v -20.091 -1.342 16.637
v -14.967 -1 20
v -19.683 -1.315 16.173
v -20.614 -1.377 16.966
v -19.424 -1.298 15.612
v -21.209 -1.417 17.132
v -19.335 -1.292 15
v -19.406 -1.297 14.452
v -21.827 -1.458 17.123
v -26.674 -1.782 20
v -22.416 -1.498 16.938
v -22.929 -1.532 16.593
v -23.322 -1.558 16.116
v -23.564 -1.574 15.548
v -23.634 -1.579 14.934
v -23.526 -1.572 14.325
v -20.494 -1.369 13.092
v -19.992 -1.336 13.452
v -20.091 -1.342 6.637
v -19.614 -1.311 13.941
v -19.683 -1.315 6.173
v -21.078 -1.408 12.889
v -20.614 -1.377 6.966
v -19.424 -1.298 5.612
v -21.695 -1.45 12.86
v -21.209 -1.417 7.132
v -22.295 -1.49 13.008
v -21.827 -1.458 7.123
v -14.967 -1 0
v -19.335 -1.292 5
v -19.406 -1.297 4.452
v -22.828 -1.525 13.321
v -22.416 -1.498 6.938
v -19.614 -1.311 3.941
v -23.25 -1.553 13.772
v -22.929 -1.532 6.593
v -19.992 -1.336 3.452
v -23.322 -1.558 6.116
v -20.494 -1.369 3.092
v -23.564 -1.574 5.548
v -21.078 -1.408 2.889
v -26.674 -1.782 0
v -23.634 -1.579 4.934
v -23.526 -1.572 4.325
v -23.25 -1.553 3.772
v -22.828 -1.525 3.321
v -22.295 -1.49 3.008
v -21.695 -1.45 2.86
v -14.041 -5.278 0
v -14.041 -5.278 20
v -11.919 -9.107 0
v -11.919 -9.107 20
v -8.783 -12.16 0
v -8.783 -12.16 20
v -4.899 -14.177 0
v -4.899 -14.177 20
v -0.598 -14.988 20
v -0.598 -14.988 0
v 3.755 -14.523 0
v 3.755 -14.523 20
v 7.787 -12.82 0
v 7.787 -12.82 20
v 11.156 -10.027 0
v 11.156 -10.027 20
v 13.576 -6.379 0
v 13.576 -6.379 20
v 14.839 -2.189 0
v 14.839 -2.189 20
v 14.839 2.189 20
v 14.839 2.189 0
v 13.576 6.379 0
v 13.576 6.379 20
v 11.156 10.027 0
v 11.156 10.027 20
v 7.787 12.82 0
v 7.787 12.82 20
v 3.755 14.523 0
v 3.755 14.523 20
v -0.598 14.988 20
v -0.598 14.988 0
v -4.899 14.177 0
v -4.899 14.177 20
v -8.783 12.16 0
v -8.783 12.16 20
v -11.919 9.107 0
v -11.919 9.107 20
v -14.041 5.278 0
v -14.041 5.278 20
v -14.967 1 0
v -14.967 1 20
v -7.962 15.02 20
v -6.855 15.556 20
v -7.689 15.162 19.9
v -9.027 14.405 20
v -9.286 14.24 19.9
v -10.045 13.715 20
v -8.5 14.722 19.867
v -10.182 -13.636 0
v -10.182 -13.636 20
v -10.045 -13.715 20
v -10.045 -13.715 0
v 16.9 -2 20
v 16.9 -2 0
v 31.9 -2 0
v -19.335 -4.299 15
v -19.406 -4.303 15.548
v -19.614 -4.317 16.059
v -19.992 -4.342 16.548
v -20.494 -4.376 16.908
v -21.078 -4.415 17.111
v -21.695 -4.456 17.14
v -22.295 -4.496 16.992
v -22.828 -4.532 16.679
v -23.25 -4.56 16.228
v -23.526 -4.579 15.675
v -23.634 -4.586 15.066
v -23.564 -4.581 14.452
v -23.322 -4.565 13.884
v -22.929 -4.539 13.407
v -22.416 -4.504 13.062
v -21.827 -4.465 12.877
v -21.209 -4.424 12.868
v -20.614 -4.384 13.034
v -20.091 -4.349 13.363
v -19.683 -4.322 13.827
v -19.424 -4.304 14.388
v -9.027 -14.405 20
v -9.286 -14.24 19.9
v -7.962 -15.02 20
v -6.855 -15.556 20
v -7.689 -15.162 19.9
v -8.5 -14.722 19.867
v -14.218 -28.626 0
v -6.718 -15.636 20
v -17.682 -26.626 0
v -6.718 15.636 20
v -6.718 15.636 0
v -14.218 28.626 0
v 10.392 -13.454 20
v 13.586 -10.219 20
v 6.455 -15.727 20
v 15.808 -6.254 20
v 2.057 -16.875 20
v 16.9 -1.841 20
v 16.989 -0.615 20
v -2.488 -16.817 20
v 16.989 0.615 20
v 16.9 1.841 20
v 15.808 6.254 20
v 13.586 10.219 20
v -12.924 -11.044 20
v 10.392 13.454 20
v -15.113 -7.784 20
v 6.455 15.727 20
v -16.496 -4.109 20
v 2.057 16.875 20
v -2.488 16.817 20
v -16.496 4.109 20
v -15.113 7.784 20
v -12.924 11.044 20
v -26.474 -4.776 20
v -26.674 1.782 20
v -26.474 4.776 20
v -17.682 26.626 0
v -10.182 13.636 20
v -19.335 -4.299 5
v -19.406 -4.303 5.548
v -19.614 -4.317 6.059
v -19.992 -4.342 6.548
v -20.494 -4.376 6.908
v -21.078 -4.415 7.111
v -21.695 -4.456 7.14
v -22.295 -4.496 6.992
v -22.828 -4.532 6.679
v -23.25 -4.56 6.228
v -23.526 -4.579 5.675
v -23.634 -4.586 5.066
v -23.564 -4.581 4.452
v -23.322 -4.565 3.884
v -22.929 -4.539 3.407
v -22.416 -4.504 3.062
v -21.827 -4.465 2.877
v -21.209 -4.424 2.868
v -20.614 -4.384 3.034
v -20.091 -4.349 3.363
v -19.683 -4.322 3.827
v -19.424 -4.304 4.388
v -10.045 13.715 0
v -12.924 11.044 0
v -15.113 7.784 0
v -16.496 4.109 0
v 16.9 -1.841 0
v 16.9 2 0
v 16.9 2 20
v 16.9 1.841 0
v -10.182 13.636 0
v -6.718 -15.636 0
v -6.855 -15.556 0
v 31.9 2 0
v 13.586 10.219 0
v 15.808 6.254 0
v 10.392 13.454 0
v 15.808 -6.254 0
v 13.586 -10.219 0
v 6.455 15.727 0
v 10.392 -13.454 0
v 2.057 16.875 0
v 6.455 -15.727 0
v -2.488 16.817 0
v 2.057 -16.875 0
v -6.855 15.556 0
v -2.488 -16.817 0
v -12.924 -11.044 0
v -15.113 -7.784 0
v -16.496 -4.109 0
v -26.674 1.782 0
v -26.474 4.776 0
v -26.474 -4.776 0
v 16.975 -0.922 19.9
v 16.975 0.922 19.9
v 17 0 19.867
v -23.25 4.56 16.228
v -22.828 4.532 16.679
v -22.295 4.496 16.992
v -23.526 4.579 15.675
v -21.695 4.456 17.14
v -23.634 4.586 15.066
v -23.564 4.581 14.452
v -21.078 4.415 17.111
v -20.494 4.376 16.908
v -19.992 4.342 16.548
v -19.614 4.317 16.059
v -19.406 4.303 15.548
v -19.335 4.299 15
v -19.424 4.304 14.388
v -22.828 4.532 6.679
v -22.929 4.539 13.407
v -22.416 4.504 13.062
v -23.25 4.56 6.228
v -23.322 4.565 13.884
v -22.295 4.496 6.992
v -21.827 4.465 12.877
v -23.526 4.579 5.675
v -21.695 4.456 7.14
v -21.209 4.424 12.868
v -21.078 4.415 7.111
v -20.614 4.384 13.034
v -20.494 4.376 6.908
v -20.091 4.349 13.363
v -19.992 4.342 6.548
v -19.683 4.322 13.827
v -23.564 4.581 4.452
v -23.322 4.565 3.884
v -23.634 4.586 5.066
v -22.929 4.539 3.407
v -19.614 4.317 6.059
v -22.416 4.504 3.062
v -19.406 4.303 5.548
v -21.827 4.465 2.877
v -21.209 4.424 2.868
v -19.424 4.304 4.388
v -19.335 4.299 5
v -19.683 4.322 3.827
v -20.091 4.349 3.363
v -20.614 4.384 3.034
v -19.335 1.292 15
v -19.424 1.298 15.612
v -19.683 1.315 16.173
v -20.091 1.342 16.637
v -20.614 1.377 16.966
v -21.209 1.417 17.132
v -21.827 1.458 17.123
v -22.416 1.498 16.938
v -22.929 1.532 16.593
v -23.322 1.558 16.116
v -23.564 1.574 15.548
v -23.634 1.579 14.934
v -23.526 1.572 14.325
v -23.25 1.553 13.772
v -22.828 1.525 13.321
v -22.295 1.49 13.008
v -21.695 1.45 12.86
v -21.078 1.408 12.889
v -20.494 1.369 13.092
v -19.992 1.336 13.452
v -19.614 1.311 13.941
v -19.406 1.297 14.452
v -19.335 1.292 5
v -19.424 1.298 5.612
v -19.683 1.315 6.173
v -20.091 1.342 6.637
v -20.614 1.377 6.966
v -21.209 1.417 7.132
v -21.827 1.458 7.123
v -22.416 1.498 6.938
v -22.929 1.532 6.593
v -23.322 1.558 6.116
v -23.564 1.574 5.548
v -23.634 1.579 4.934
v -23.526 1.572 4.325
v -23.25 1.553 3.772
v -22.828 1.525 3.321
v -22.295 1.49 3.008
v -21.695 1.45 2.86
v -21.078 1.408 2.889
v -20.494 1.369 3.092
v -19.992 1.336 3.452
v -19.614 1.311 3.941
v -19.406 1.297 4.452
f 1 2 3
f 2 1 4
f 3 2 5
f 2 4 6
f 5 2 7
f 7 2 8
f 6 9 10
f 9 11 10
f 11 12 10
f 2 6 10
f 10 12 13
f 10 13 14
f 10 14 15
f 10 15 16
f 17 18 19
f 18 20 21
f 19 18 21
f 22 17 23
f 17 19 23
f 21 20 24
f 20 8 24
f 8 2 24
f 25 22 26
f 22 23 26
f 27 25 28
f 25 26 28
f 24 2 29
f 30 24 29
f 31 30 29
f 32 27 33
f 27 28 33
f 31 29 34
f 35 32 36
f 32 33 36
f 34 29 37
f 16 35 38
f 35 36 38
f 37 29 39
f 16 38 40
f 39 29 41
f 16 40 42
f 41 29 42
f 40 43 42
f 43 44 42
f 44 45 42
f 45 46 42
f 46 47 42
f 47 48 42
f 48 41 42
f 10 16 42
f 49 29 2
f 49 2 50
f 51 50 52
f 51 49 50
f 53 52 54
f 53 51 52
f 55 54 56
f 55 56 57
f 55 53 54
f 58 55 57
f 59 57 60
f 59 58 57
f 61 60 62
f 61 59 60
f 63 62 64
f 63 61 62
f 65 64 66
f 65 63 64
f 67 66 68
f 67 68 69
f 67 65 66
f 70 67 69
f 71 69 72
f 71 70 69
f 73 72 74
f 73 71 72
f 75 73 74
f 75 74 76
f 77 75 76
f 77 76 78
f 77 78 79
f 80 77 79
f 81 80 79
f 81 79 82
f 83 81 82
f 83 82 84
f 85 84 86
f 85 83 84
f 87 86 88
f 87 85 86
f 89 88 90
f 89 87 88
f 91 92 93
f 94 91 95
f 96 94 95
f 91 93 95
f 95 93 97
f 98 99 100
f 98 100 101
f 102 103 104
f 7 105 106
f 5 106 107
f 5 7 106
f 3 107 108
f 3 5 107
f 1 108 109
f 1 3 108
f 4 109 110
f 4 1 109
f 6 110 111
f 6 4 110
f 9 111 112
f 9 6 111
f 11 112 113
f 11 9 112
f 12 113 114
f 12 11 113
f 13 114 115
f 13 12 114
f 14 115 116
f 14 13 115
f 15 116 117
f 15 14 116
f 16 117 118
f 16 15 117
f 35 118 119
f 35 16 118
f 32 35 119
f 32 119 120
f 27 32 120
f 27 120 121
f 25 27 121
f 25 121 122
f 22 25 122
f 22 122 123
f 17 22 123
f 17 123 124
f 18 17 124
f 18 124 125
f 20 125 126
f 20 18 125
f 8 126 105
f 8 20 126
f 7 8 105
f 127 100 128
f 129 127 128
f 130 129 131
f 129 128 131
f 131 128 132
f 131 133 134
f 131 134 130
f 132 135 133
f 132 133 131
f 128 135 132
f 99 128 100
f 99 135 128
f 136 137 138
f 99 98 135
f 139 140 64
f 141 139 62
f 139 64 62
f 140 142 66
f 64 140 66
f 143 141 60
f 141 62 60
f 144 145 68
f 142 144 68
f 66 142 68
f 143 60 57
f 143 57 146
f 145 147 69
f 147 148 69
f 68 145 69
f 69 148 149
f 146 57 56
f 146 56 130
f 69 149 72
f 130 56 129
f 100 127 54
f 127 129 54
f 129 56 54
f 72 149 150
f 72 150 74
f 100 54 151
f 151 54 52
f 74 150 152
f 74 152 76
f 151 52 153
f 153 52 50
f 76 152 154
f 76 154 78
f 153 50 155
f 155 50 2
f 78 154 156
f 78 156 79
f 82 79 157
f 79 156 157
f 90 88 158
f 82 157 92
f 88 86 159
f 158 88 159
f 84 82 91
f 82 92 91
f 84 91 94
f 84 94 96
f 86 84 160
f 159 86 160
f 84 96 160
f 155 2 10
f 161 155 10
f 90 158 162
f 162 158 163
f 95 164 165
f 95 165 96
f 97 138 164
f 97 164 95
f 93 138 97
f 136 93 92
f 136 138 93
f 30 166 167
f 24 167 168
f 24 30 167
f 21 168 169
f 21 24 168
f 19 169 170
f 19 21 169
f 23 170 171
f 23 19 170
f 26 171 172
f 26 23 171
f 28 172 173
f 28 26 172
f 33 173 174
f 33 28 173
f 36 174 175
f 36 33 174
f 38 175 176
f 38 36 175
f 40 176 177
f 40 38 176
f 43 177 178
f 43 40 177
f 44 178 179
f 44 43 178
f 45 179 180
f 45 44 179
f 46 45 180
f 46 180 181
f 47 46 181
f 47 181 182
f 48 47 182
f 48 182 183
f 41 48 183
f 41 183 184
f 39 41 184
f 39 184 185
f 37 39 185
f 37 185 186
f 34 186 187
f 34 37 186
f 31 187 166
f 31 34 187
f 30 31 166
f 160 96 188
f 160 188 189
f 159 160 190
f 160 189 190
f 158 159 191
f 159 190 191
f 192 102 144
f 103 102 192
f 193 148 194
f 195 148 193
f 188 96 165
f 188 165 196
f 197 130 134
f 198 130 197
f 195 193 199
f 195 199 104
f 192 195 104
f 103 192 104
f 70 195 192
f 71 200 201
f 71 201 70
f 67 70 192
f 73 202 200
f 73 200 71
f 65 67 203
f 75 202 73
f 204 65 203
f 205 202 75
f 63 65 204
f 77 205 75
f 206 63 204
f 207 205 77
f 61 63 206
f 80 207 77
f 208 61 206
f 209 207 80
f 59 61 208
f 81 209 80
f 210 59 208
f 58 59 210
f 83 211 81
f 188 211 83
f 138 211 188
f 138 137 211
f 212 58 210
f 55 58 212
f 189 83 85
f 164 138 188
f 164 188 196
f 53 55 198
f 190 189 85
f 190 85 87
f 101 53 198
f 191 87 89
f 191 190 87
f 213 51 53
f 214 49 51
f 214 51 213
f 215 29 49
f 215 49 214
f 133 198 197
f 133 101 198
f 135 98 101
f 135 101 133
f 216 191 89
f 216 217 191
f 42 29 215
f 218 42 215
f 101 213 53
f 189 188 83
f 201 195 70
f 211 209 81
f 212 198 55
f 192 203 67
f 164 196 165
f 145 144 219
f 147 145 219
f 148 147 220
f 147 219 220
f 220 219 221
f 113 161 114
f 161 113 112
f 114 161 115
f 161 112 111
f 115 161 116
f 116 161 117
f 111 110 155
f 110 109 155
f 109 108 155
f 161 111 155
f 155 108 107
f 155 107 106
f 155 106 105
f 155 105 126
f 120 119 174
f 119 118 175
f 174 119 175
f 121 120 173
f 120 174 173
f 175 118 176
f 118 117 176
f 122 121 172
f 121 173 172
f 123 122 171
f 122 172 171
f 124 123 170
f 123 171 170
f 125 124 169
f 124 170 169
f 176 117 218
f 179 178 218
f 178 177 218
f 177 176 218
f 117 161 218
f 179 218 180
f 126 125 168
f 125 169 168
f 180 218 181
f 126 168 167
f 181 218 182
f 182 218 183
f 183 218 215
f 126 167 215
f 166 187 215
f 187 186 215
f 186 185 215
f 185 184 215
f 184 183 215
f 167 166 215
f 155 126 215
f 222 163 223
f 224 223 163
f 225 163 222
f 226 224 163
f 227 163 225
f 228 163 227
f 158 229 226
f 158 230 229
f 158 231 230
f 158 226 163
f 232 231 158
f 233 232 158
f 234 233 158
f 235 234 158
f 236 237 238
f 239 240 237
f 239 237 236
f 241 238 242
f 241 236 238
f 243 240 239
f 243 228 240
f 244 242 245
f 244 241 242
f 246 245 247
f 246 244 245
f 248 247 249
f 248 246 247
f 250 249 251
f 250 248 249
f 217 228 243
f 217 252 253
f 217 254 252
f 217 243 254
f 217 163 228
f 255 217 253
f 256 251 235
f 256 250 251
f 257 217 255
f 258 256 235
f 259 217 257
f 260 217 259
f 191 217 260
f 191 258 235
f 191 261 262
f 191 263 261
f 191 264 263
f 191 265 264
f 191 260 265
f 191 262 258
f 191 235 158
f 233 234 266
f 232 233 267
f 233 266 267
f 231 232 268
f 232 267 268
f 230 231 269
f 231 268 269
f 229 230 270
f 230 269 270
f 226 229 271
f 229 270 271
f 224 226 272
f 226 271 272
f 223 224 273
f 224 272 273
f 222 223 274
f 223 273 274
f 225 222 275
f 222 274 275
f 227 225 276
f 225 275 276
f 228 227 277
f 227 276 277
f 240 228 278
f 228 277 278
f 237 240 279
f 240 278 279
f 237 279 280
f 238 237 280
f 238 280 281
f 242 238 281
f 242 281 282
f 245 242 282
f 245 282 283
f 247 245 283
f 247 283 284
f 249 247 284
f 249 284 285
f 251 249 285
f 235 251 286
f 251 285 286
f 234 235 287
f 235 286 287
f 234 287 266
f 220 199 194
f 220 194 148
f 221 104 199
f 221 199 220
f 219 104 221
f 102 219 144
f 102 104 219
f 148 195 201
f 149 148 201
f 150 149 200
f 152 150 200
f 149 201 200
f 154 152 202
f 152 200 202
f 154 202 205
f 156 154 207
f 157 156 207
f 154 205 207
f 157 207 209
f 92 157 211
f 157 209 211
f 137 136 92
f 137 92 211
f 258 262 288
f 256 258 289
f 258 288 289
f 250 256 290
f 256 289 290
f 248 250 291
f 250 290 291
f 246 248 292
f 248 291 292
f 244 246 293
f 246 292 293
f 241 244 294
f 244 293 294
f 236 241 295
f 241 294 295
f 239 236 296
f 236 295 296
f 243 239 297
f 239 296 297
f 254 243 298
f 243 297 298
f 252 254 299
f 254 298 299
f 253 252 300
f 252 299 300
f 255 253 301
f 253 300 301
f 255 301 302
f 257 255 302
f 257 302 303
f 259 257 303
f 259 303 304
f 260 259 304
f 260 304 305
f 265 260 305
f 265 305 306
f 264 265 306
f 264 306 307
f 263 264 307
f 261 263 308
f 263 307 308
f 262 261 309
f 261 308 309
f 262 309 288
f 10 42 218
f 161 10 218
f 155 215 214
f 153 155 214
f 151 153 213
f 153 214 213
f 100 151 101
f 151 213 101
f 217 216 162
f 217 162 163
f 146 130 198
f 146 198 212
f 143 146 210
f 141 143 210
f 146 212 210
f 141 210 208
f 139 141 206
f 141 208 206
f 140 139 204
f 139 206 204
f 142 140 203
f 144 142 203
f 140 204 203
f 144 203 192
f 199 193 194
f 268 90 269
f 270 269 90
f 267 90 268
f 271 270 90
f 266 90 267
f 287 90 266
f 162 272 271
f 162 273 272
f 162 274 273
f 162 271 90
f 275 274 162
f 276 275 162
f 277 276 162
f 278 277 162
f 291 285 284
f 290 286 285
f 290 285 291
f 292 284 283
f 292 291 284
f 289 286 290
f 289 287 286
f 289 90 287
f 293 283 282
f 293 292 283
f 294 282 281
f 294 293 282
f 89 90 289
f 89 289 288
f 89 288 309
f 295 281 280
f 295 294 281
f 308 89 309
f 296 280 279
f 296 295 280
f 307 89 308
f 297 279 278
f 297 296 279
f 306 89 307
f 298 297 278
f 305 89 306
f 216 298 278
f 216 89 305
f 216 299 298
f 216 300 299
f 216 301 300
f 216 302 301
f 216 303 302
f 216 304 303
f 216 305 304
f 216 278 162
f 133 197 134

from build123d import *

# Parameters (mm, degrees)
PAD_DEPTH          = 20
SKETCH001_R        = 2.15
POCKET_DEPTH       = 17.001
POCKET_DEPTH_BACK  = -17.001
PAD001_DEPTH       = 2
POLARPATTERN_COUNT = 3
POLARPATTERN_ANGLE = 240


with BuildPart() as part:
    # Sketch → Pad (new body)
    with BuildSketch(Plane.XY):
        with BuildLine():
            ThreePointArc((-14.96663, -1), (15, 0), (-14.96663, 1))
            Line((-14.96663, 1), (-26.673727, 1.782213))
            Line((-26.673727, 1.782213), (-26.473727, 4.775539))
            Line((-26.473727, 4.775539), (-16.495974, 4.108873))
            ThreePointArc((-16.495974, -4.108873), (17, 0), (-16.495974, 4.108873))
            Line((-26.473727, -4.775539), (-16.495974, -4.108873))
            Line((-26.673727, -1.782213), (-26.473727, -4.775539))
            Line((-14.96663, -1), (-26.673727, -1.782213))
        make_face()
    extrude(amount=PAD_DEPTH)

    # Sketch001 → Pocket (cut, two sides)
    with BuildSketch(Plane.XZ) as pocket_sk:
        with Locations((-21.484851, 15)):
            Circle(SKETCH001_R)
        with Locations((-21.484851, 5)):
            Circle(SKETCH001_R)
    extrude(amount=-POCKET_DEPTH, mode=Mode.SUBTRACT)
    extrude(pocket_sk.sketch, amount=-POCKET_DEPTH_BACK, mode=Mode.SUBTRACT)

    # Sketch002 → Pad001 (join, symmetric)
    with BuildSketch(Plane.XZ):
        Polygon((16.9, 20), (16.9, 0), (31.9, 0), align=None)
    pad001 = extrude(amount=PAD001_DEPTH, both=True)

    # PolarPattern: Pad001 ×3 about axis
    polarpattern_axis = Axis((0, 0, 0), (0, 0, 1))
    for i in range(1, POLARPATTERN_COUNT):
        add(pad001.rotate(polarpattern_axis, i * POLARPATTERN_ANGLE / (POLARPATTERN_COUNT - 1)))


solid = part.part
